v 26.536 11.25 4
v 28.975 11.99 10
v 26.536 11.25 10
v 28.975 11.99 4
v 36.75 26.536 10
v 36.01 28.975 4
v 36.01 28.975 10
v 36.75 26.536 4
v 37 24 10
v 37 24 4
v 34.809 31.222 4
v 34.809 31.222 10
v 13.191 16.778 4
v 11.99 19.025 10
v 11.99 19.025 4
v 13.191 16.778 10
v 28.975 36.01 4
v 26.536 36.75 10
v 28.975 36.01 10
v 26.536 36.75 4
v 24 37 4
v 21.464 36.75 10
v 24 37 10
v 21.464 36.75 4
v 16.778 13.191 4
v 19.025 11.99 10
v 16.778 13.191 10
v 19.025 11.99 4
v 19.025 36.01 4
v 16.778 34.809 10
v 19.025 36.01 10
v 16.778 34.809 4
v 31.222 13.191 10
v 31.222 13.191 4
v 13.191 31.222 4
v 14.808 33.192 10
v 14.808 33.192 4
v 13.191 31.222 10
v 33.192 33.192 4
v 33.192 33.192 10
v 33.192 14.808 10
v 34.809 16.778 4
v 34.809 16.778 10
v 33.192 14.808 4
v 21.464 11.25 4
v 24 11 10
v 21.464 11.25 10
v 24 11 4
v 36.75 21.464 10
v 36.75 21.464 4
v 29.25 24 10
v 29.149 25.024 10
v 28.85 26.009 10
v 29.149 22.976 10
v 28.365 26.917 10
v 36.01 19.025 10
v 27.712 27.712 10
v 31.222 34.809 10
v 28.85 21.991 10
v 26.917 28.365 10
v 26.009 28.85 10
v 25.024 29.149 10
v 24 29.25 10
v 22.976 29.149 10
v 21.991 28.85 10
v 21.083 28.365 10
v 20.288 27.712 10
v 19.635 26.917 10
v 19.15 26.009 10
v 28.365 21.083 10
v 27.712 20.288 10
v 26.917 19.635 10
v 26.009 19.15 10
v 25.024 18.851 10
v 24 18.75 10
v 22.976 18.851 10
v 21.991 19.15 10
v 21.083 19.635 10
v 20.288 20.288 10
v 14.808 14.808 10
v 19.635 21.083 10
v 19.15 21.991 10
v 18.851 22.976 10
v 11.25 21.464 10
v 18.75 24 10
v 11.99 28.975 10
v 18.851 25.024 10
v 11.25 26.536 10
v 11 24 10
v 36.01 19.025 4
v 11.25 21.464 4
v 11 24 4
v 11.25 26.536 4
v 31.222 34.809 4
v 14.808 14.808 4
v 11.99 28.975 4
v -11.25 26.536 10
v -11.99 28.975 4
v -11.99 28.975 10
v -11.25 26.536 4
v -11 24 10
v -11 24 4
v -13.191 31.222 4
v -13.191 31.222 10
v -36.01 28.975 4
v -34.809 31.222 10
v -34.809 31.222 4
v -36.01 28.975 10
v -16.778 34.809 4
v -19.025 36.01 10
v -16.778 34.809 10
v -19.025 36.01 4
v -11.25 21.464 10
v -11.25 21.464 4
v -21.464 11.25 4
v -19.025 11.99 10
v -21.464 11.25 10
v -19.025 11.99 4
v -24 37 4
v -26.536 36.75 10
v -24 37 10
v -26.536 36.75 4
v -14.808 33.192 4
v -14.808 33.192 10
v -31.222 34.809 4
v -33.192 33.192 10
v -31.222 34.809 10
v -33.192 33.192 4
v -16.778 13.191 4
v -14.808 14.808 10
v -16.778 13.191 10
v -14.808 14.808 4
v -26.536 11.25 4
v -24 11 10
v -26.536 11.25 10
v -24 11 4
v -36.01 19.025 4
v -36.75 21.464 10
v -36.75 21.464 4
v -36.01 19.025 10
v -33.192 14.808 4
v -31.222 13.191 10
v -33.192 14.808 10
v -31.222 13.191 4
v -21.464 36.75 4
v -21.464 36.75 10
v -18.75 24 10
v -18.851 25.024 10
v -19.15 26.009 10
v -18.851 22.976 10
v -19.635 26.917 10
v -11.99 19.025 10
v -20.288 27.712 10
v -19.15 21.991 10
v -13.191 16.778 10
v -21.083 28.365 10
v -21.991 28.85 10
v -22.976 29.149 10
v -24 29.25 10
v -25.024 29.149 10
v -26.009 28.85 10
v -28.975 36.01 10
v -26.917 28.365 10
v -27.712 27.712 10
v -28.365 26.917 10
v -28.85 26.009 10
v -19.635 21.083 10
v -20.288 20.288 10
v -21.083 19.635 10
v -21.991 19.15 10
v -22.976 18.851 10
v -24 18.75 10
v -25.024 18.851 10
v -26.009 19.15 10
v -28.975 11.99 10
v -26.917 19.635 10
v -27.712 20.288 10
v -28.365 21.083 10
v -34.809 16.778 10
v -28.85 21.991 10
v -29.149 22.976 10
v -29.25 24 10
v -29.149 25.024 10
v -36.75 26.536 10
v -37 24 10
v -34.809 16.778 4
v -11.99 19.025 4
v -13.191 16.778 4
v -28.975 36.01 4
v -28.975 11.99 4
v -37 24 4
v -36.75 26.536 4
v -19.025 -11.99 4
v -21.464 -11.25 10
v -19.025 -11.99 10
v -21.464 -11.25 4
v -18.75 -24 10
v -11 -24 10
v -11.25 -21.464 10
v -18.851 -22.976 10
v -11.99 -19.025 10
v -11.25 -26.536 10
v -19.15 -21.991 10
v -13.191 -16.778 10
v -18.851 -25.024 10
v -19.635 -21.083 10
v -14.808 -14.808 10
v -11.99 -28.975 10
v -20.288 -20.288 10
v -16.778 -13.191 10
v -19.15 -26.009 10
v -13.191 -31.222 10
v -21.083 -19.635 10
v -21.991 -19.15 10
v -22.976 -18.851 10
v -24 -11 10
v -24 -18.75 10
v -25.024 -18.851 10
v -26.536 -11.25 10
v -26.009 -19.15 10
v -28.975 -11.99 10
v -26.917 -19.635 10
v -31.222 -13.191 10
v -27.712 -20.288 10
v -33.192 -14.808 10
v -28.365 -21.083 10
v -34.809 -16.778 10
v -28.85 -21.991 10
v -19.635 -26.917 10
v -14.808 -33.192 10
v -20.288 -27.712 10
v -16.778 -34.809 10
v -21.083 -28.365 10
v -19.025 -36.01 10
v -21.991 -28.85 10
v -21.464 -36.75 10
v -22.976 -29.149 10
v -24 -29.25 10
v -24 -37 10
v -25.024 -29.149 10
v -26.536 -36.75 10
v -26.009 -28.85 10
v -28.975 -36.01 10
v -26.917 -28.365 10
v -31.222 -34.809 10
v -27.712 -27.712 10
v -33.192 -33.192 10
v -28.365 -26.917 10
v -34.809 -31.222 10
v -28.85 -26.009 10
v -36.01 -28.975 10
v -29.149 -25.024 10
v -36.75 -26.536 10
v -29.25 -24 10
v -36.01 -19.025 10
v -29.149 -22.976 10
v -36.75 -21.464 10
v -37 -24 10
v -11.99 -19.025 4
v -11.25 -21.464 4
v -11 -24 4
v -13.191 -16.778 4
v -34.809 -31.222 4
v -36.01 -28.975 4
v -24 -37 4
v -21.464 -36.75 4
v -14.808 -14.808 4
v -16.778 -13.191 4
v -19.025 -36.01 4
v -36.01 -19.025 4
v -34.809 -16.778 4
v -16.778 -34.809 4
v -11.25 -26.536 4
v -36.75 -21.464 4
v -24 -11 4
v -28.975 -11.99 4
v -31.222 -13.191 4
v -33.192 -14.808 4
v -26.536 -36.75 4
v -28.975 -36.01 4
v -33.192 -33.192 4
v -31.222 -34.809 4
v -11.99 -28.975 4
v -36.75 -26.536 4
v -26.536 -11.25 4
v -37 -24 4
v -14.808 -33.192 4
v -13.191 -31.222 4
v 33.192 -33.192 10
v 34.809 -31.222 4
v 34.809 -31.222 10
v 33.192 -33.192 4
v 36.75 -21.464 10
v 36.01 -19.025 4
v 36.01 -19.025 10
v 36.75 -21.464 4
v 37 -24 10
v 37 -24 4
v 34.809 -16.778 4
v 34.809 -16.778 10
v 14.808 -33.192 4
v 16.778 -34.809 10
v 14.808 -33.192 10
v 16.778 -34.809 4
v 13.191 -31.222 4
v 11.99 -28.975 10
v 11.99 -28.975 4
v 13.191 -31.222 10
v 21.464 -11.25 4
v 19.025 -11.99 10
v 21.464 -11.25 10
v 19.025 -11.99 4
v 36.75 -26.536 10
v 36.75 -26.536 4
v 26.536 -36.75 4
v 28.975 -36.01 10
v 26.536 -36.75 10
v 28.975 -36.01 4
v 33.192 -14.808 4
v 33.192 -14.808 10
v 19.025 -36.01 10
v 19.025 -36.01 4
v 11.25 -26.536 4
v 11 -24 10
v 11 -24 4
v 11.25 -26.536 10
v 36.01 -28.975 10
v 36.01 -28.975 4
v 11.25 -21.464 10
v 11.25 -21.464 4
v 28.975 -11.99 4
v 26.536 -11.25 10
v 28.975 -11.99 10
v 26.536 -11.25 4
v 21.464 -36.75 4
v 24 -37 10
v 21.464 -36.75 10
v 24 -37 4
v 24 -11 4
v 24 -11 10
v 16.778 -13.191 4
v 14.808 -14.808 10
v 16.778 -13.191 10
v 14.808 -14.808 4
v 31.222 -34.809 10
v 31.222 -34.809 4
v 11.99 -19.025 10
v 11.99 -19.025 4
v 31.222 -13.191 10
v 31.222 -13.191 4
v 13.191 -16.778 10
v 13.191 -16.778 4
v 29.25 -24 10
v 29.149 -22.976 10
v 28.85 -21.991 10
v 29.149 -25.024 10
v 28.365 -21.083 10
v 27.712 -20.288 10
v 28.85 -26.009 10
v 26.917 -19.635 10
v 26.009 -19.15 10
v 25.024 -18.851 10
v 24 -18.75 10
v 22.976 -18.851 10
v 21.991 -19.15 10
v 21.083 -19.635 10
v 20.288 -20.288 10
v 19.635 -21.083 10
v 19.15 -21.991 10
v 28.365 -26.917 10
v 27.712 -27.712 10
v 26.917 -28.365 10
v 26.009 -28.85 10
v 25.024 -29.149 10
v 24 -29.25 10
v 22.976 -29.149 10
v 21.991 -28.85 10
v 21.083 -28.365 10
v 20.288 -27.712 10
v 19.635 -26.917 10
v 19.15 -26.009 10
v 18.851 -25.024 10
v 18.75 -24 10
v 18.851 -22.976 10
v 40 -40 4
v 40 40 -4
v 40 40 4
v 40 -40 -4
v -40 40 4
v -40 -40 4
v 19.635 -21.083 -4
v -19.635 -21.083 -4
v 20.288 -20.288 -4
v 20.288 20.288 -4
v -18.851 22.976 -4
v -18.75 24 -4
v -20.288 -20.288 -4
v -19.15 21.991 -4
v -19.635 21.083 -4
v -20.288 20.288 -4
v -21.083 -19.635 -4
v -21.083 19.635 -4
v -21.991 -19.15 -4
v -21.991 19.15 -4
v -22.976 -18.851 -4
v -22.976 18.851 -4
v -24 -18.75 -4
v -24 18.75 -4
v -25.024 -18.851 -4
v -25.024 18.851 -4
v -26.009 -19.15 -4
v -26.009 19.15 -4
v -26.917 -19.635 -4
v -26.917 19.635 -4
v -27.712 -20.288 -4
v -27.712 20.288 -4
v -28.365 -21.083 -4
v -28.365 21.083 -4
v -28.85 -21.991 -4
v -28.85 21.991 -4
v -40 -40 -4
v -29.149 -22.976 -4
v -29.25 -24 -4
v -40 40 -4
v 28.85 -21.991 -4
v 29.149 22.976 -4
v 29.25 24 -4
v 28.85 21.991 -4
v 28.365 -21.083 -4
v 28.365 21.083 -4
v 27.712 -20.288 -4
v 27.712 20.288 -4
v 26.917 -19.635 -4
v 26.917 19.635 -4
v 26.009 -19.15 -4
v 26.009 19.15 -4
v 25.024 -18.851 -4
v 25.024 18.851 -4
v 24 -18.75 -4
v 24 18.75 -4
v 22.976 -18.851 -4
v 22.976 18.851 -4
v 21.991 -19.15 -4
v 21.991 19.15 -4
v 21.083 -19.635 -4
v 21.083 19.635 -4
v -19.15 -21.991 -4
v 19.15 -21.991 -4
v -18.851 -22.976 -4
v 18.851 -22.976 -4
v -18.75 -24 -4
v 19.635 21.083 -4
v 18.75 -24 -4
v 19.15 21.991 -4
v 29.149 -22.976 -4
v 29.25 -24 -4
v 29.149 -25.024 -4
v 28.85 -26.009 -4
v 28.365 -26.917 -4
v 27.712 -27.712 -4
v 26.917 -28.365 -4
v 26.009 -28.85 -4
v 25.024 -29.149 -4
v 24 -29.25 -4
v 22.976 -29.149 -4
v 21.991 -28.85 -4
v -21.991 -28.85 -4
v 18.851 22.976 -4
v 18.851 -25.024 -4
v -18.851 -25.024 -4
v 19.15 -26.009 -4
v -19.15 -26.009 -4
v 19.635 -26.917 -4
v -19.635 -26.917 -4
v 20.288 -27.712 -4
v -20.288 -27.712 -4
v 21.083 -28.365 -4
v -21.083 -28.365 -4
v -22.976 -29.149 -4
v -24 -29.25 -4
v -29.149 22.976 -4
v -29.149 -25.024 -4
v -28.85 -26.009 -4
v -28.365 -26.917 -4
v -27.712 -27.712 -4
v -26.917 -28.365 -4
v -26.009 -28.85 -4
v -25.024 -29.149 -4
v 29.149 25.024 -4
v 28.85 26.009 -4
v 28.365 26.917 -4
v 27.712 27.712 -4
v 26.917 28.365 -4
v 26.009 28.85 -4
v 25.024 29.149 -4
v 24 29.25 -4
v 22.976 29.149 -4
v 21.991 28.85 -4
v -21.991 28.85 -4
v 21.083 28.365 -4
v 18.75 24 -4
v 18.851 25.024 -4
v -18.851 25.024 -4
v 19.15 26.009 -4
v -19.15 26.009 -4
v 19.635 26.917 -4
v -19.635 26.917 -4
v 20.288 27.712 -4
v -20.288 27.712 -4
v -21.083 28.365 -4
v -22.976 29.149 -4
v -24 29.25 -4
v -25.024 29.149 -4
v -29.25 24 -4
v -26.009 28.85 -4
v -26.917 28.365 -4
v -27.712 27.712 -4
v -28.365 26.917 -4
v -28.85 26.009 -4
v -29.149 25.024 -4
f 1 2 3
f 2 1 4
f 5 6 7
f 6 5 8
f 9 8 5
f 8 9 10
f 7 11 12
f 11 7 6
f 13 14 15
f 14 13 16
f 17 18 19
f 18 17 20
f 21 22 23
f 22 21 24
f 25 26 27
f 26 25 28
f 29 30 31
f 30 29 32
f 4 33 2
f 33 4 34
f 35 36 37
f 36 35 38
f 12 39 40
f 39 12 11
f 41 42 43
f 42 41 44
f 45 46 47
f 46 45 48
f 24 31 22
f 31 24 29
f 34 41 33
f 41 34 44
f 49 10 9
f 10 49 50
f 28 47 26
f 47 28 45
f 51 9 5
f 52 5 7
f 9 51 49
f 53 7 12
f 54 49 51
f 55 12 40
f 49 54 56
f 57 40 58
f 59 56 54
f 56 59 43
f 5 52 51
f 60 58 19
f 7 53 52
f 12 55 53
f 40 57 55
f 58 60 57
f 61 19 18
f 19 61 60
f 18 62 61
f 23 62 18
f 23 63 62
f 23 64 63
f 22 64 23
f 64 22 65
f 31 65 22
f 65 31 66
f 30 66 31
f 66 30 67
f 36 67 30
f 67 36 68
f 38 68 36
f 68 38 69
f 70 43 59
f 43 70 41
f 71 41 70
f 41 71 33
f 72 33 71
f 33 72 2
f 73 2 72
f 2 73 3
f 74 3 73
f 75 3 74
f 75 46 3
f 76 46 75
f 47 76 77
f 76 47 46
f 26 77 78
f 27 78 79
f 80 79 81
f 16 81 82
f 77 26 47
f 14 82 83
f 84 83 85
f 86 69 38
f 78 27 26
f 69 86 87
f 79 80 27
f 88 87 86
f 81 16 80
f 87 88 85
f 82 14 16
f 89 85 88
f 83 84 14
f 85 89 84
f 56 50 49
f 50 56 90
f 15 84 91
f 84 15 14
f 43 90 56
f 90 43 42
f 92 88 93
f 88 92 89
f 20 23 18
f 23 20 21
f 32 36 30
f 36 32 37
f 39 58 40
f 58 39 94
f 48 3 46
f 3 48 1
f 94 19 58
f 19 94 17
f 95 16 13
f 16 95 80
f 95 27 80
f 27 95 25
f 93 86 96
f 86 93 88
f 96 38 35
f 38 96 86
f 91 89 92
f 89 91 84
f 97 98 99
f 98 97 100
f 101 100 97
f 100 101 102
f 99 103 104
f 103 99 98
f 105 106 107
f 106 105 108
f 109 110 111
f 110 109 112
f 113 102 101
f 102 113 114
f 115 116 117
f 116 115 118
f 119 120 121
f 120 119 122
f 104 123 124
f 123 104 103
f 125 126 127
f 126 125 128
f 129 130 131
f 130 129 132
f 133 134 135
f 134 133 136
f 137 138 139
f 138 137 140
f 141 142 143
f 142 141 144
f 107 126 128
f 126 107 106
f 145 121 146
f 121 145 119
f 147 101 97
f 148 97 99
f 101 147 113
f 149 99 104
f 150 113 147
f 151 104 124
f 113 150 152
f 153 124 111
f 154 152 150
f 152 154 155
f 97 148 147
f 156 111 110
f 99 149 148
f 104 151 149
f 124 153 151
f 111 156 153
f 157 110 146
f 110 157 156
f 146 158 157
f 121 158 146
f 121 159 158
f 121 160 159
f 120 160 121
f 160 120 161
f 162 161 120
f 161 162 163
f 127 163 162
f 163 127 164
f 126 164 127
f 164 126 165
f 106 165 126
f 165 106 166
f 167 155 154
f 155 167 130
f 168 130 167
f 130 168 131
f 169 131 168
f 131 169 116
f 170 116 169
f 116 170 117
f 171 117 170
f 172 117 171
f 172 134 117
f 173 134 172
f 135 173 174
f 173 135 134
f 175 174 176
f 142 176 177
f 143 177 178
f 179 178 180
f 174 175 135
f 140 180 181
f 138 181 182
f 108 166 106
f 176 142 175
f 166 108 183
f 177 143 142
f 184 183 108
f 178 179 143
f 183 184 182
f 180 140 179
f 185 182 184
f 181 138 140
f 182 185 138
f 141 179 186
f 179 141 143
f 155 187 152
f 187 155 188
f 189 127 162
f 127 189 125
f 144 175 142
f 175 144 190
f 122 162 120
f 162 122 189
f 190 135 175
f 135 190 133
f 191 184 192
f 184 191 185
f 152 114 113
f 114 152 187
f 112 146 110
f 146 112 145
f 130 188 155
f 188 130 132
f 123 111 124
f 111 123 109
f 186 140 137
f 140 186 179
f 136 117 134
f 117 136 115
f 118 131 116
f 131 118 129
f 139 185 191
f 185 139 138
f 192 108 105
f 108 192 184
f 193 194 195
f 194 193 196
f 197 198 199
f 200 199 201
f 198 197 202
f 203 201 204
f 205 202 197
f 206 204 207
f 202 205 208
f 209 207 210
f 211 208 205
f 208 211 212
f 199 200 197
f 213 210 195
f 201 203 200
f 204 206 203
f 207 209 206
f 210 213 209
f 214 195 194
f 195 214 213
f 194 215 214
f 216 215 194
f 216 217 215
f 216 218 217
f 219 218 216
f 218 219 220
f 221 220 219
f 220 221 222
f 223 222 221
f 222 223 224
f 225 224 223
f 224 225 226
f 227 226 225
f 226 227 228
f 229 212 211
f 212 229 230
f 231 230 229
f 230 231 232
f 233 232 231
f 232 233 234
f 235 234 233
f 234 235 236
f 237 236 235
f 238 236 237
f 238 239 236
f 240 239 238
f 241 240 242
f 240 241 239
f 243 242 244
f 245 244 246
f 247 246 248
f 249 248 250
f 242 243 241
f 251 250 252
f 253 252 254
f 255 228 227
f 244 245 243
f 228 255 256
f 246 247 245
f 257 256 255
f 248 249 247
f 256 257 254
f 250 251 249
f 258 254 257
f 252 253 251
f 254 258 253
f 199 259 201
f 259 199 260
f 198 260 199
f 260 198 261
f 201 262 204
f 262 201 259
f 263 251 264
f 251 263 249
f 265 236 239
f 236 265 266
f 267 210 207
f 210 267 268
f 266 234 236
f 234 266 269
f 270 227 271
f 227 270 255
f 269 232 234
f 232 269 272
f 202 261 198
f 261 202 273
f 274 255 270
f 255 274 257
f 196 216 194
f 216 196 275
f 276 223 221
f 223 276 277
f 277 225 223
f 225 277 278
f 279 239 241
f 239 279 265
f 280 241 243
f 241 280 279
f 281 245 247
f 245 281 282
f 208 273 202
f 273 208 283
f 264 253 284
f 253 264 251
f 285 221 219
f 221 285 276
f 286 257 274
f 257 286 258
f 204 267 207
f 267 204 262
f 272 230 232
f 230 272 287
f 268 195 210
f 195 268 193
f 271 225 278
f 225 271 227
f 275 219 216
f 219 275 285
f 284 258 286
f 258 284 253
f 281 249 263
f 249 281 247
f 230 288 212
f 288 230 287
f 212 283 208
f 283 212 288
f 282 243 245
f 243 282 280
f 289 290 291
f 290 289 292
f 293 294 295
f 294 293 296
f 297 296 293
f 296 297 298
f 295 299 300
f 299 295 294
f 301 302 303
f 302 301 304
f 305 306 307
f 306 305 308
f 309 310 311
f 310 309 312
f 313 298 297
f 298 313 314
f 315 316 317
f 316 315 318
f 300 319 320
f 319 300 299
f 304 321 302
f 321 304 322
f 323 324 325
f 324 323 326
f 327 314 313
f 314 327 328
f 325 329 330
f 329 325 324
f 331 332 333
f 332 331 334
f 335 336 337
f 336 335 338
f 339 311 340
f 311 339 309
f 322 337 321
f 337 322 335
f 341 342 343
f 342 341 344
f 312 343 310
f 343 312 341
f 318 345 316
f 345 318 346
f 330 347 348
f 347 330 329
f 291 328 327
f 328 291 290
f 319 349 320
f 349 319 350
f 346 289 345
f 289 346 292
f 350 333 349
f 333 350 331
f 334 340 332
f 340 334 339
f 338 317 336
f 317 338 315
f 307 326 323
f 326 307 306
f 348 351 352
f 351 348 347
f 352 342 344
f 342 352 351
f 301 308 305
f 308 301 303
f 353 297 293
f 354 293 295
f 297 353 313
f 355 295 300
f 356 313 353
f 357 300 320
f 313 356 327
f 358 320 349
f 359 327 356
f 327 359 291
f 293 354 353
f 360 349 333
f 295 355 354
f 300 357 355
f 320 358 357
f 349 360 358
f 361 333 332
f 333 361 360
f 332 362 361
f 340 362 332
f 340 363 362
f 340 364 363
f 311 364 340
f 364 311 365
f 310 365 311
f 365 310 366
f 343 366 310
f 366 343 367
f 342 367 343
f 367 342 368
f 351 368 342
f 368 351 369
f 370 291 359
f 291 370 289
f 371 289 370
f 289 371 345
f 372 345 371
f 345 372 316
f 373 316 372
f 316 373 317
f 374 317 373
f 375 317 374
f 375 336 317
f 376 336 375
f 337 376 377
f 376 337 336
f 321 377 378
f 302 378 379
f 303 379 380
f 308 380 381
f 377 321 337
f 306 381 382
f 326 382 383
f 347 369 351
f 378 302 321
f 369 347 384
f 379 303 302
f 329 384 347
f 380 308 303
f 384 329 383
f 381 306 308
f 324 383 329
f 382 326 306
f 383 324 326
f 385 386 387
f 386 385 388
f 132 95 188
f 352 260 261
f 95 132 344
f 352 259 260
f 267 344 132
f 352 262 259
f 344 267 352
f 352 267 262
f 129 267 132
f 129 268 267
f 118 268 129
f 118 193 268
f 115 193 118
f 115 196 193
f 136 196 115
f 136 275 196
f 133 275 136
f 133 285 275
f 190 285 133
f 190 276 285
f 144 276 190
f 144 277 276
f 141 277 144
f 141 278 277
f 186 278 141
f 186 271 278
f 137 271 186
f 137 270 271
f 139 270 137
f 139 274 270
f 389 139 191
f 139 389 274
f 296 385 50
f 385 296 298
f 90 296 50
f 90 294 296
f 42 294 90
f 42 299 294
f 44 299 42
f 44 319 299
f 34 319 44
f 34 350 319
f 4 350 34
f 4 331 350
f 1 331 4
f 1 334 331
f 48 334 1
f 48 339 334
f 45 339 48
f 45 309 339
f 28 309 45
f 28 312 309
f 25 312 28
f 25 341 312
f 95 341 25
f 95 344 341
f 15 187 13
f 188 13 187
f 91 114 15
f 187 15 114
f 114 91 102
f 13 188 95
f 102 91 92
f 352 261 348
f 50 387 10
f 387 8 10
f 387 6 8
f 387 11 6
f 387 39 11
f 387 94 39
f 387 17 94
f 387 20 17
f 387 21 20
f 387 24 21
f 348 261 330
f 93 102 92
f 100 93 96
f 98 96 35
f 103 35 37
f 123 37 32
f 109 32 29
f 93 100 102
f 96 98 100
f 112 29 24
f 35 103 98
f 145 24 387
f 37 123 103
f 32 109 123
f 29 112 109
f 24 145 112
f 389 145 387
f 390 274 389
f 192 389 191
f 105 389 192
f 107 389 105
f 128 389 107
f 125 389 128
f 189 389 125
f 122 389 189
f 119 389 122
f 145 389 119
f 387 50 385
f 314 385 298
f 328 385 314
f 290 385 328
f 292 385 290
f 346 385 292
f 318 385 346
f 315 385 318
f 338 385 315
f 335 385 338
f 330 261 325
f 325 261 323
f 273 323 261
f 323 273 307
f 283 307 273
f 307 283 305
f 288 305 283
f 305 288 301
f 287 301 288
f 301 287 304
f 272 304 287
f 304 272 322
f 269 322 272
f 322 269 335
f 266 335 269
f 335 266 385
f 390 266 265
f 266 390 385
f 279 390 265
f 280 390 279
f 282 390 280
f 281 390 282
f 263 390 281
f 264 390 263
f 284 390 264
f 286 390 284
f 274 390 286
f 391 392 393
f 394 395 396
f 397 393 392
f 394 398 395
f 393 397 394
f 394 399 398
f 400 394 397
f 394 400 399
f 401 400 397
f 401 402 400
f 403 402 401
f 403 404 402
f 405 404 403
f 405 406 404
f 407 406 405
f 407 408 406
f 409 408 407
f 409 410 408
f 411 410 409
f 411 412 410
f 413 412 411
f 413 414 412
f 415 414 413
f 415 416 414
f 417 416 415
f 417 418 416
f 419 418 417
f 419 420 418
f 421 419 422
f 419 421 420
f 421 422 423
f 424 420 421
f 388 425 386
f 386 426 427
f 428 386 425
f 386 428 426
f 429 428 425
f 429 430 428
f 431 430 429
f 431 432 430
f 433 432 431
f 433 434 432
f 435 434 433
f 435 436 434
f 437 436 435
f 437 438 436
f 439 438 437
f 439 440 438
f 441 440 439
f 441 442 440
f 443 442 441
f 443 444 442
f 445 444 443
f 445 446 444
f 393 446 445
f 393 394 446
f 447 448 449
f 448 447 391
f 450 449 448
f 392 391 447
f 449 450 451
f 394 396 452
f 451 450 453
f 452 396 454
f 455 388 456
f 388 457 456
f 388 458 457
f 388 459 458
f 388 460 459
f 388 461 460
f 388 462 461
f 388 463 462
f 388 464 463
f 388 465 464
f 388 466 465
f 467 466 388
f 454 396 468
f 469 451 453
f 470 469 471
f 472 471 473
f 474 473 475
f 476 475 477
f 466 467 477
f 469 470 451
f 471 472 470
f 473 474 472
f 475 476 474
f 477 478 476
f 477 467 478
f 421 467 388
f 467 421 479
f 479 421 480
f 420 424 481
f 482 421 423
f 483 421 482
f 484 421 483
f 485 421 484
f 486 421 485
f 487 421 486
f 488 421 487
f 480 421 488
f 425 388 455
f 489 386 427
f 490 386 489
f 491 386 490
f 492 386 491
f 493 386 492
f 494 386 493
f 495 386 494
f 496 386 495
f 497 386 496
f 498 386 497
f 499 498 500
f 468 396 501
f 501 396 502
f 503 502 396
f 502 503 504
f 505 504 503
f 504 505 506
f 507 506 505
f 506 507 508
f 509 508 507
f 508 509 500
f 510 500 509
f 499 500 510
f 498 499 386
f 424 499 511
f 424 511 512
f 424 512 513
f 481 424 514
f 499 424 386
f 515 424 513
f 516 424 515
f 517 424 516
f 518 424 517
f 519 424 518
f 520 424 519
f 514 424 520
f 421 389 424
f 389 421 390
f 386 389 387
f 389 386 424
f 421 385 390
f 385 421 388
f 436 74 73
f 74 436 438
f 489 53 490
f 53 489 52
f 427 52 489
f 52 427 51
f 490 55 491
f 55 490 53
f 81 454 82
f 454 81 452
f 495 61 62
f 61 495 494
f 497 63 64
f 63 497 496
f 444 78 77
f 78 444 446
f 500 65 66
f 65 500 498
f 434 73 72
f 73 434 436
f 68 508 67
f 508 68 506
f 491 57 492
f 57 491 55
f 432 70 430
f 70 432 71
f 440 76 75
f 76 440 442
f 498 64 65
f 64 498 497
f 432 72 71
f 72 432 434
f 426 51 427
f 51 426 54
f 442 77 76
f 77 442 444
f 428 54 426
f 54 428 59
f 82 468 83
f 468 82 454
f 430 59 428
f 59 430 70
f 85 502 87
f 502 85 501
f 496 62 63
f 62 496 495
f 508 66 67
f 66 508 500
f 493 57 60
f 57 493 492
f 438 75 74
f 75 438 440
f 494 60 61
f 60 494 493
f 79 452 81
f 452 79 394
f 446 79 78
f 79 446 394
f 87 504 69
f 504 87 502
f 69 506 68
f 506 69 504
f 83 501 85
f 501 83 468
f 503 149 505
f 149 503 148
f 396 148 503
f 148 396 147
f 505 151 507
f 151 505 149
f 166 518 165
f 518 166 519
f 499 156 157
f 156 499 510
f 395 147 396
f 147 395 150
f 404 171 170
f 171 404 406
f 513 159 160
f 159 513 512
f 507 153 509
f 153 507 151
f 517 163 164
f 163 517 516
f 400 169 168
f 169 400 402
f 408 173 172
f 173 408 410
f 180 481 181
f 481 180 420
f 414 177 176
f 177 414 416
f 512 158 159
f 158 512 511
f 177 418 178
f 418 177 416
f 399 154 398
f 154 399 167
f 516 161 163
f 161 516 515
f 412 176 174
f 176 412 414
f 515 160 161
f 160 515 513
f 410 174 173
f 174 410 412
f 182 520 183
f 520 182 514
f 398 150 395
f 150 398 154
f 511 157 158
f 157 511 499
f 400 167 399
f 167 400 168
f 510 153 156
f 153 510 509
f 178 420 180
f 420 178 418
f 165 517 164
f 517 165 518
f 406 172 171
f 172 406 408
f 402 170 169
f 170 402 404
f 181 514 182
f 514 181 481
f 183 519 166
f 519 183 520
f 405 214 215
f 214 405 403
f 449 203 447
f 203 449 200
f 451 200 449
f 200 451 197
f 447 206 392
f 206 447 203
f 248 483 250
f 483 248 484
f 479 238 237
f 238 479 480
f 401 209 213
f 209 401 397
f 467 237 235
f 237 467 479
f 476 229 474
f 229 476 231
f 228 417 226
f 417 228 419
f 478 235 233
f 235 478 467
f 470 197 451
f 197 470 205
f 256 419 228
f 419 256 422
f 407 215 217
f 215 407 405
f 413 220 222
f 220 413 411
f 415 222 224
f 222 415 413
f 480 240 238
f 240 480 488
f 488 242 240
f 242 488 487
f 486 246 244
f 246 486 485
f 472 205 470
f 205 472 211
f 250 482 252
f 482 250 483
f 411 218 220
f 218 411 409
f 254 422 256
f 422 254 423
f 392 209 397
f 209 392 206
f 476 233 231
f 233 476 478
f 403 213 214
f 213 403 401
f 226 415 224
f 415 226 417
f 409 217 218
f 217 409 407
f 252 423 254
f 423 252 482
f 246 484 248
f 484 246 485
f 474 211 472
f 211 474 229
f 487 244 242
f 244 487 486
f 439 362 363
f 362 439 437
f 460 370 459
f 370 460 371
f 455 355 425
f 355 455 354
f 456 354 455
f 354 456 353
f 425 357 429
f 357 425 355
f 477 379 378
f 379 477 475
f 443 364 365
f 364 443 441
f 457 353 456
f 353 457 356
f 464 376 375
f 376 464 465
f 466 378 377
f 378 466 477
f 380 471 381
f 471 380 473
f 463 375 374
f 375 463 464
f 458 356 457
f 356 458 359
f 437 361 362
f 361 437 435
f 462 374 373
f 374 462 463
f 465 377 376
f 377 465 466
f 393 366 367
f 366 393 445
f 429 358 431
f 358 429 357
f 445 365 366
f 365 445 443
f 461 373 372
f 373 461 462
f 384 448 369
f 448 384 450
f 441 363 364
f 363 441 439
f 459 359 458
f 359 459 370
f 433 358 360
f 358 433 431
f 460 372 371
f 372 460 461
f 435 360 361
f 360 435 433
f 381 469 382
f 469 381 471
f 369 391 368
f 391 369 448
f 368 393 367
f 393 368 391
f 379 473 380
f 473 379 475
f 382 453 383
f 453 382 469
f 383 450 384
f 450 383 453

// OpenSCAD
$fn = 32;

// ----------------------------------------------------------------------
// Anchor pads 80 x 80 x 14
// four corner bosses with anchor holes
// ----------------------------------------------------------------------

// --- parameters (mm) ---
plate = [80, 80, 8];  // base plate size (x, y, z)
pads = 4;             // boss count, one per corner
edge = 16;            // boss centre offset from the plate edge
boss_d = 26;          // boss diameter
boss_h = 6;           // boss height above the base plate
hole_d = 10.5;        // hole diameter

// --- derived feature positions (mm) ---
height = plate[2] + boss_h;      // = 14   overall height of the part
corner_x = plate[0] / 2 - edge;  // = 24   boss centre X
corner_y = plate[1] / 2 - edge;  // = 24   boss centre Y
feature_centers = [
  [corner_x, corner_y],
  [-corner_x, corner_y],
  [-corner_x, -corner_y],
  [corner_x, -corner_y]
];   // boss centres, anchor holes are drilled there

// base plate, four bosses standing on it, anchor holes all the way through
difference() {
  union() {
    cube(plate, center = true);
    for (centre = feature_centers)
      translate([centre[0], centre[1], plate[2] / 2 - 1])
        cylinder(d = boss_d, h = boss_h + 1);
  }
  for (centre = feature_centers)
    translate([centre[0], centre[1], -height])
      cylinder(d = hole_d, h = 2 * height + 2);  // through boss and plate
}
